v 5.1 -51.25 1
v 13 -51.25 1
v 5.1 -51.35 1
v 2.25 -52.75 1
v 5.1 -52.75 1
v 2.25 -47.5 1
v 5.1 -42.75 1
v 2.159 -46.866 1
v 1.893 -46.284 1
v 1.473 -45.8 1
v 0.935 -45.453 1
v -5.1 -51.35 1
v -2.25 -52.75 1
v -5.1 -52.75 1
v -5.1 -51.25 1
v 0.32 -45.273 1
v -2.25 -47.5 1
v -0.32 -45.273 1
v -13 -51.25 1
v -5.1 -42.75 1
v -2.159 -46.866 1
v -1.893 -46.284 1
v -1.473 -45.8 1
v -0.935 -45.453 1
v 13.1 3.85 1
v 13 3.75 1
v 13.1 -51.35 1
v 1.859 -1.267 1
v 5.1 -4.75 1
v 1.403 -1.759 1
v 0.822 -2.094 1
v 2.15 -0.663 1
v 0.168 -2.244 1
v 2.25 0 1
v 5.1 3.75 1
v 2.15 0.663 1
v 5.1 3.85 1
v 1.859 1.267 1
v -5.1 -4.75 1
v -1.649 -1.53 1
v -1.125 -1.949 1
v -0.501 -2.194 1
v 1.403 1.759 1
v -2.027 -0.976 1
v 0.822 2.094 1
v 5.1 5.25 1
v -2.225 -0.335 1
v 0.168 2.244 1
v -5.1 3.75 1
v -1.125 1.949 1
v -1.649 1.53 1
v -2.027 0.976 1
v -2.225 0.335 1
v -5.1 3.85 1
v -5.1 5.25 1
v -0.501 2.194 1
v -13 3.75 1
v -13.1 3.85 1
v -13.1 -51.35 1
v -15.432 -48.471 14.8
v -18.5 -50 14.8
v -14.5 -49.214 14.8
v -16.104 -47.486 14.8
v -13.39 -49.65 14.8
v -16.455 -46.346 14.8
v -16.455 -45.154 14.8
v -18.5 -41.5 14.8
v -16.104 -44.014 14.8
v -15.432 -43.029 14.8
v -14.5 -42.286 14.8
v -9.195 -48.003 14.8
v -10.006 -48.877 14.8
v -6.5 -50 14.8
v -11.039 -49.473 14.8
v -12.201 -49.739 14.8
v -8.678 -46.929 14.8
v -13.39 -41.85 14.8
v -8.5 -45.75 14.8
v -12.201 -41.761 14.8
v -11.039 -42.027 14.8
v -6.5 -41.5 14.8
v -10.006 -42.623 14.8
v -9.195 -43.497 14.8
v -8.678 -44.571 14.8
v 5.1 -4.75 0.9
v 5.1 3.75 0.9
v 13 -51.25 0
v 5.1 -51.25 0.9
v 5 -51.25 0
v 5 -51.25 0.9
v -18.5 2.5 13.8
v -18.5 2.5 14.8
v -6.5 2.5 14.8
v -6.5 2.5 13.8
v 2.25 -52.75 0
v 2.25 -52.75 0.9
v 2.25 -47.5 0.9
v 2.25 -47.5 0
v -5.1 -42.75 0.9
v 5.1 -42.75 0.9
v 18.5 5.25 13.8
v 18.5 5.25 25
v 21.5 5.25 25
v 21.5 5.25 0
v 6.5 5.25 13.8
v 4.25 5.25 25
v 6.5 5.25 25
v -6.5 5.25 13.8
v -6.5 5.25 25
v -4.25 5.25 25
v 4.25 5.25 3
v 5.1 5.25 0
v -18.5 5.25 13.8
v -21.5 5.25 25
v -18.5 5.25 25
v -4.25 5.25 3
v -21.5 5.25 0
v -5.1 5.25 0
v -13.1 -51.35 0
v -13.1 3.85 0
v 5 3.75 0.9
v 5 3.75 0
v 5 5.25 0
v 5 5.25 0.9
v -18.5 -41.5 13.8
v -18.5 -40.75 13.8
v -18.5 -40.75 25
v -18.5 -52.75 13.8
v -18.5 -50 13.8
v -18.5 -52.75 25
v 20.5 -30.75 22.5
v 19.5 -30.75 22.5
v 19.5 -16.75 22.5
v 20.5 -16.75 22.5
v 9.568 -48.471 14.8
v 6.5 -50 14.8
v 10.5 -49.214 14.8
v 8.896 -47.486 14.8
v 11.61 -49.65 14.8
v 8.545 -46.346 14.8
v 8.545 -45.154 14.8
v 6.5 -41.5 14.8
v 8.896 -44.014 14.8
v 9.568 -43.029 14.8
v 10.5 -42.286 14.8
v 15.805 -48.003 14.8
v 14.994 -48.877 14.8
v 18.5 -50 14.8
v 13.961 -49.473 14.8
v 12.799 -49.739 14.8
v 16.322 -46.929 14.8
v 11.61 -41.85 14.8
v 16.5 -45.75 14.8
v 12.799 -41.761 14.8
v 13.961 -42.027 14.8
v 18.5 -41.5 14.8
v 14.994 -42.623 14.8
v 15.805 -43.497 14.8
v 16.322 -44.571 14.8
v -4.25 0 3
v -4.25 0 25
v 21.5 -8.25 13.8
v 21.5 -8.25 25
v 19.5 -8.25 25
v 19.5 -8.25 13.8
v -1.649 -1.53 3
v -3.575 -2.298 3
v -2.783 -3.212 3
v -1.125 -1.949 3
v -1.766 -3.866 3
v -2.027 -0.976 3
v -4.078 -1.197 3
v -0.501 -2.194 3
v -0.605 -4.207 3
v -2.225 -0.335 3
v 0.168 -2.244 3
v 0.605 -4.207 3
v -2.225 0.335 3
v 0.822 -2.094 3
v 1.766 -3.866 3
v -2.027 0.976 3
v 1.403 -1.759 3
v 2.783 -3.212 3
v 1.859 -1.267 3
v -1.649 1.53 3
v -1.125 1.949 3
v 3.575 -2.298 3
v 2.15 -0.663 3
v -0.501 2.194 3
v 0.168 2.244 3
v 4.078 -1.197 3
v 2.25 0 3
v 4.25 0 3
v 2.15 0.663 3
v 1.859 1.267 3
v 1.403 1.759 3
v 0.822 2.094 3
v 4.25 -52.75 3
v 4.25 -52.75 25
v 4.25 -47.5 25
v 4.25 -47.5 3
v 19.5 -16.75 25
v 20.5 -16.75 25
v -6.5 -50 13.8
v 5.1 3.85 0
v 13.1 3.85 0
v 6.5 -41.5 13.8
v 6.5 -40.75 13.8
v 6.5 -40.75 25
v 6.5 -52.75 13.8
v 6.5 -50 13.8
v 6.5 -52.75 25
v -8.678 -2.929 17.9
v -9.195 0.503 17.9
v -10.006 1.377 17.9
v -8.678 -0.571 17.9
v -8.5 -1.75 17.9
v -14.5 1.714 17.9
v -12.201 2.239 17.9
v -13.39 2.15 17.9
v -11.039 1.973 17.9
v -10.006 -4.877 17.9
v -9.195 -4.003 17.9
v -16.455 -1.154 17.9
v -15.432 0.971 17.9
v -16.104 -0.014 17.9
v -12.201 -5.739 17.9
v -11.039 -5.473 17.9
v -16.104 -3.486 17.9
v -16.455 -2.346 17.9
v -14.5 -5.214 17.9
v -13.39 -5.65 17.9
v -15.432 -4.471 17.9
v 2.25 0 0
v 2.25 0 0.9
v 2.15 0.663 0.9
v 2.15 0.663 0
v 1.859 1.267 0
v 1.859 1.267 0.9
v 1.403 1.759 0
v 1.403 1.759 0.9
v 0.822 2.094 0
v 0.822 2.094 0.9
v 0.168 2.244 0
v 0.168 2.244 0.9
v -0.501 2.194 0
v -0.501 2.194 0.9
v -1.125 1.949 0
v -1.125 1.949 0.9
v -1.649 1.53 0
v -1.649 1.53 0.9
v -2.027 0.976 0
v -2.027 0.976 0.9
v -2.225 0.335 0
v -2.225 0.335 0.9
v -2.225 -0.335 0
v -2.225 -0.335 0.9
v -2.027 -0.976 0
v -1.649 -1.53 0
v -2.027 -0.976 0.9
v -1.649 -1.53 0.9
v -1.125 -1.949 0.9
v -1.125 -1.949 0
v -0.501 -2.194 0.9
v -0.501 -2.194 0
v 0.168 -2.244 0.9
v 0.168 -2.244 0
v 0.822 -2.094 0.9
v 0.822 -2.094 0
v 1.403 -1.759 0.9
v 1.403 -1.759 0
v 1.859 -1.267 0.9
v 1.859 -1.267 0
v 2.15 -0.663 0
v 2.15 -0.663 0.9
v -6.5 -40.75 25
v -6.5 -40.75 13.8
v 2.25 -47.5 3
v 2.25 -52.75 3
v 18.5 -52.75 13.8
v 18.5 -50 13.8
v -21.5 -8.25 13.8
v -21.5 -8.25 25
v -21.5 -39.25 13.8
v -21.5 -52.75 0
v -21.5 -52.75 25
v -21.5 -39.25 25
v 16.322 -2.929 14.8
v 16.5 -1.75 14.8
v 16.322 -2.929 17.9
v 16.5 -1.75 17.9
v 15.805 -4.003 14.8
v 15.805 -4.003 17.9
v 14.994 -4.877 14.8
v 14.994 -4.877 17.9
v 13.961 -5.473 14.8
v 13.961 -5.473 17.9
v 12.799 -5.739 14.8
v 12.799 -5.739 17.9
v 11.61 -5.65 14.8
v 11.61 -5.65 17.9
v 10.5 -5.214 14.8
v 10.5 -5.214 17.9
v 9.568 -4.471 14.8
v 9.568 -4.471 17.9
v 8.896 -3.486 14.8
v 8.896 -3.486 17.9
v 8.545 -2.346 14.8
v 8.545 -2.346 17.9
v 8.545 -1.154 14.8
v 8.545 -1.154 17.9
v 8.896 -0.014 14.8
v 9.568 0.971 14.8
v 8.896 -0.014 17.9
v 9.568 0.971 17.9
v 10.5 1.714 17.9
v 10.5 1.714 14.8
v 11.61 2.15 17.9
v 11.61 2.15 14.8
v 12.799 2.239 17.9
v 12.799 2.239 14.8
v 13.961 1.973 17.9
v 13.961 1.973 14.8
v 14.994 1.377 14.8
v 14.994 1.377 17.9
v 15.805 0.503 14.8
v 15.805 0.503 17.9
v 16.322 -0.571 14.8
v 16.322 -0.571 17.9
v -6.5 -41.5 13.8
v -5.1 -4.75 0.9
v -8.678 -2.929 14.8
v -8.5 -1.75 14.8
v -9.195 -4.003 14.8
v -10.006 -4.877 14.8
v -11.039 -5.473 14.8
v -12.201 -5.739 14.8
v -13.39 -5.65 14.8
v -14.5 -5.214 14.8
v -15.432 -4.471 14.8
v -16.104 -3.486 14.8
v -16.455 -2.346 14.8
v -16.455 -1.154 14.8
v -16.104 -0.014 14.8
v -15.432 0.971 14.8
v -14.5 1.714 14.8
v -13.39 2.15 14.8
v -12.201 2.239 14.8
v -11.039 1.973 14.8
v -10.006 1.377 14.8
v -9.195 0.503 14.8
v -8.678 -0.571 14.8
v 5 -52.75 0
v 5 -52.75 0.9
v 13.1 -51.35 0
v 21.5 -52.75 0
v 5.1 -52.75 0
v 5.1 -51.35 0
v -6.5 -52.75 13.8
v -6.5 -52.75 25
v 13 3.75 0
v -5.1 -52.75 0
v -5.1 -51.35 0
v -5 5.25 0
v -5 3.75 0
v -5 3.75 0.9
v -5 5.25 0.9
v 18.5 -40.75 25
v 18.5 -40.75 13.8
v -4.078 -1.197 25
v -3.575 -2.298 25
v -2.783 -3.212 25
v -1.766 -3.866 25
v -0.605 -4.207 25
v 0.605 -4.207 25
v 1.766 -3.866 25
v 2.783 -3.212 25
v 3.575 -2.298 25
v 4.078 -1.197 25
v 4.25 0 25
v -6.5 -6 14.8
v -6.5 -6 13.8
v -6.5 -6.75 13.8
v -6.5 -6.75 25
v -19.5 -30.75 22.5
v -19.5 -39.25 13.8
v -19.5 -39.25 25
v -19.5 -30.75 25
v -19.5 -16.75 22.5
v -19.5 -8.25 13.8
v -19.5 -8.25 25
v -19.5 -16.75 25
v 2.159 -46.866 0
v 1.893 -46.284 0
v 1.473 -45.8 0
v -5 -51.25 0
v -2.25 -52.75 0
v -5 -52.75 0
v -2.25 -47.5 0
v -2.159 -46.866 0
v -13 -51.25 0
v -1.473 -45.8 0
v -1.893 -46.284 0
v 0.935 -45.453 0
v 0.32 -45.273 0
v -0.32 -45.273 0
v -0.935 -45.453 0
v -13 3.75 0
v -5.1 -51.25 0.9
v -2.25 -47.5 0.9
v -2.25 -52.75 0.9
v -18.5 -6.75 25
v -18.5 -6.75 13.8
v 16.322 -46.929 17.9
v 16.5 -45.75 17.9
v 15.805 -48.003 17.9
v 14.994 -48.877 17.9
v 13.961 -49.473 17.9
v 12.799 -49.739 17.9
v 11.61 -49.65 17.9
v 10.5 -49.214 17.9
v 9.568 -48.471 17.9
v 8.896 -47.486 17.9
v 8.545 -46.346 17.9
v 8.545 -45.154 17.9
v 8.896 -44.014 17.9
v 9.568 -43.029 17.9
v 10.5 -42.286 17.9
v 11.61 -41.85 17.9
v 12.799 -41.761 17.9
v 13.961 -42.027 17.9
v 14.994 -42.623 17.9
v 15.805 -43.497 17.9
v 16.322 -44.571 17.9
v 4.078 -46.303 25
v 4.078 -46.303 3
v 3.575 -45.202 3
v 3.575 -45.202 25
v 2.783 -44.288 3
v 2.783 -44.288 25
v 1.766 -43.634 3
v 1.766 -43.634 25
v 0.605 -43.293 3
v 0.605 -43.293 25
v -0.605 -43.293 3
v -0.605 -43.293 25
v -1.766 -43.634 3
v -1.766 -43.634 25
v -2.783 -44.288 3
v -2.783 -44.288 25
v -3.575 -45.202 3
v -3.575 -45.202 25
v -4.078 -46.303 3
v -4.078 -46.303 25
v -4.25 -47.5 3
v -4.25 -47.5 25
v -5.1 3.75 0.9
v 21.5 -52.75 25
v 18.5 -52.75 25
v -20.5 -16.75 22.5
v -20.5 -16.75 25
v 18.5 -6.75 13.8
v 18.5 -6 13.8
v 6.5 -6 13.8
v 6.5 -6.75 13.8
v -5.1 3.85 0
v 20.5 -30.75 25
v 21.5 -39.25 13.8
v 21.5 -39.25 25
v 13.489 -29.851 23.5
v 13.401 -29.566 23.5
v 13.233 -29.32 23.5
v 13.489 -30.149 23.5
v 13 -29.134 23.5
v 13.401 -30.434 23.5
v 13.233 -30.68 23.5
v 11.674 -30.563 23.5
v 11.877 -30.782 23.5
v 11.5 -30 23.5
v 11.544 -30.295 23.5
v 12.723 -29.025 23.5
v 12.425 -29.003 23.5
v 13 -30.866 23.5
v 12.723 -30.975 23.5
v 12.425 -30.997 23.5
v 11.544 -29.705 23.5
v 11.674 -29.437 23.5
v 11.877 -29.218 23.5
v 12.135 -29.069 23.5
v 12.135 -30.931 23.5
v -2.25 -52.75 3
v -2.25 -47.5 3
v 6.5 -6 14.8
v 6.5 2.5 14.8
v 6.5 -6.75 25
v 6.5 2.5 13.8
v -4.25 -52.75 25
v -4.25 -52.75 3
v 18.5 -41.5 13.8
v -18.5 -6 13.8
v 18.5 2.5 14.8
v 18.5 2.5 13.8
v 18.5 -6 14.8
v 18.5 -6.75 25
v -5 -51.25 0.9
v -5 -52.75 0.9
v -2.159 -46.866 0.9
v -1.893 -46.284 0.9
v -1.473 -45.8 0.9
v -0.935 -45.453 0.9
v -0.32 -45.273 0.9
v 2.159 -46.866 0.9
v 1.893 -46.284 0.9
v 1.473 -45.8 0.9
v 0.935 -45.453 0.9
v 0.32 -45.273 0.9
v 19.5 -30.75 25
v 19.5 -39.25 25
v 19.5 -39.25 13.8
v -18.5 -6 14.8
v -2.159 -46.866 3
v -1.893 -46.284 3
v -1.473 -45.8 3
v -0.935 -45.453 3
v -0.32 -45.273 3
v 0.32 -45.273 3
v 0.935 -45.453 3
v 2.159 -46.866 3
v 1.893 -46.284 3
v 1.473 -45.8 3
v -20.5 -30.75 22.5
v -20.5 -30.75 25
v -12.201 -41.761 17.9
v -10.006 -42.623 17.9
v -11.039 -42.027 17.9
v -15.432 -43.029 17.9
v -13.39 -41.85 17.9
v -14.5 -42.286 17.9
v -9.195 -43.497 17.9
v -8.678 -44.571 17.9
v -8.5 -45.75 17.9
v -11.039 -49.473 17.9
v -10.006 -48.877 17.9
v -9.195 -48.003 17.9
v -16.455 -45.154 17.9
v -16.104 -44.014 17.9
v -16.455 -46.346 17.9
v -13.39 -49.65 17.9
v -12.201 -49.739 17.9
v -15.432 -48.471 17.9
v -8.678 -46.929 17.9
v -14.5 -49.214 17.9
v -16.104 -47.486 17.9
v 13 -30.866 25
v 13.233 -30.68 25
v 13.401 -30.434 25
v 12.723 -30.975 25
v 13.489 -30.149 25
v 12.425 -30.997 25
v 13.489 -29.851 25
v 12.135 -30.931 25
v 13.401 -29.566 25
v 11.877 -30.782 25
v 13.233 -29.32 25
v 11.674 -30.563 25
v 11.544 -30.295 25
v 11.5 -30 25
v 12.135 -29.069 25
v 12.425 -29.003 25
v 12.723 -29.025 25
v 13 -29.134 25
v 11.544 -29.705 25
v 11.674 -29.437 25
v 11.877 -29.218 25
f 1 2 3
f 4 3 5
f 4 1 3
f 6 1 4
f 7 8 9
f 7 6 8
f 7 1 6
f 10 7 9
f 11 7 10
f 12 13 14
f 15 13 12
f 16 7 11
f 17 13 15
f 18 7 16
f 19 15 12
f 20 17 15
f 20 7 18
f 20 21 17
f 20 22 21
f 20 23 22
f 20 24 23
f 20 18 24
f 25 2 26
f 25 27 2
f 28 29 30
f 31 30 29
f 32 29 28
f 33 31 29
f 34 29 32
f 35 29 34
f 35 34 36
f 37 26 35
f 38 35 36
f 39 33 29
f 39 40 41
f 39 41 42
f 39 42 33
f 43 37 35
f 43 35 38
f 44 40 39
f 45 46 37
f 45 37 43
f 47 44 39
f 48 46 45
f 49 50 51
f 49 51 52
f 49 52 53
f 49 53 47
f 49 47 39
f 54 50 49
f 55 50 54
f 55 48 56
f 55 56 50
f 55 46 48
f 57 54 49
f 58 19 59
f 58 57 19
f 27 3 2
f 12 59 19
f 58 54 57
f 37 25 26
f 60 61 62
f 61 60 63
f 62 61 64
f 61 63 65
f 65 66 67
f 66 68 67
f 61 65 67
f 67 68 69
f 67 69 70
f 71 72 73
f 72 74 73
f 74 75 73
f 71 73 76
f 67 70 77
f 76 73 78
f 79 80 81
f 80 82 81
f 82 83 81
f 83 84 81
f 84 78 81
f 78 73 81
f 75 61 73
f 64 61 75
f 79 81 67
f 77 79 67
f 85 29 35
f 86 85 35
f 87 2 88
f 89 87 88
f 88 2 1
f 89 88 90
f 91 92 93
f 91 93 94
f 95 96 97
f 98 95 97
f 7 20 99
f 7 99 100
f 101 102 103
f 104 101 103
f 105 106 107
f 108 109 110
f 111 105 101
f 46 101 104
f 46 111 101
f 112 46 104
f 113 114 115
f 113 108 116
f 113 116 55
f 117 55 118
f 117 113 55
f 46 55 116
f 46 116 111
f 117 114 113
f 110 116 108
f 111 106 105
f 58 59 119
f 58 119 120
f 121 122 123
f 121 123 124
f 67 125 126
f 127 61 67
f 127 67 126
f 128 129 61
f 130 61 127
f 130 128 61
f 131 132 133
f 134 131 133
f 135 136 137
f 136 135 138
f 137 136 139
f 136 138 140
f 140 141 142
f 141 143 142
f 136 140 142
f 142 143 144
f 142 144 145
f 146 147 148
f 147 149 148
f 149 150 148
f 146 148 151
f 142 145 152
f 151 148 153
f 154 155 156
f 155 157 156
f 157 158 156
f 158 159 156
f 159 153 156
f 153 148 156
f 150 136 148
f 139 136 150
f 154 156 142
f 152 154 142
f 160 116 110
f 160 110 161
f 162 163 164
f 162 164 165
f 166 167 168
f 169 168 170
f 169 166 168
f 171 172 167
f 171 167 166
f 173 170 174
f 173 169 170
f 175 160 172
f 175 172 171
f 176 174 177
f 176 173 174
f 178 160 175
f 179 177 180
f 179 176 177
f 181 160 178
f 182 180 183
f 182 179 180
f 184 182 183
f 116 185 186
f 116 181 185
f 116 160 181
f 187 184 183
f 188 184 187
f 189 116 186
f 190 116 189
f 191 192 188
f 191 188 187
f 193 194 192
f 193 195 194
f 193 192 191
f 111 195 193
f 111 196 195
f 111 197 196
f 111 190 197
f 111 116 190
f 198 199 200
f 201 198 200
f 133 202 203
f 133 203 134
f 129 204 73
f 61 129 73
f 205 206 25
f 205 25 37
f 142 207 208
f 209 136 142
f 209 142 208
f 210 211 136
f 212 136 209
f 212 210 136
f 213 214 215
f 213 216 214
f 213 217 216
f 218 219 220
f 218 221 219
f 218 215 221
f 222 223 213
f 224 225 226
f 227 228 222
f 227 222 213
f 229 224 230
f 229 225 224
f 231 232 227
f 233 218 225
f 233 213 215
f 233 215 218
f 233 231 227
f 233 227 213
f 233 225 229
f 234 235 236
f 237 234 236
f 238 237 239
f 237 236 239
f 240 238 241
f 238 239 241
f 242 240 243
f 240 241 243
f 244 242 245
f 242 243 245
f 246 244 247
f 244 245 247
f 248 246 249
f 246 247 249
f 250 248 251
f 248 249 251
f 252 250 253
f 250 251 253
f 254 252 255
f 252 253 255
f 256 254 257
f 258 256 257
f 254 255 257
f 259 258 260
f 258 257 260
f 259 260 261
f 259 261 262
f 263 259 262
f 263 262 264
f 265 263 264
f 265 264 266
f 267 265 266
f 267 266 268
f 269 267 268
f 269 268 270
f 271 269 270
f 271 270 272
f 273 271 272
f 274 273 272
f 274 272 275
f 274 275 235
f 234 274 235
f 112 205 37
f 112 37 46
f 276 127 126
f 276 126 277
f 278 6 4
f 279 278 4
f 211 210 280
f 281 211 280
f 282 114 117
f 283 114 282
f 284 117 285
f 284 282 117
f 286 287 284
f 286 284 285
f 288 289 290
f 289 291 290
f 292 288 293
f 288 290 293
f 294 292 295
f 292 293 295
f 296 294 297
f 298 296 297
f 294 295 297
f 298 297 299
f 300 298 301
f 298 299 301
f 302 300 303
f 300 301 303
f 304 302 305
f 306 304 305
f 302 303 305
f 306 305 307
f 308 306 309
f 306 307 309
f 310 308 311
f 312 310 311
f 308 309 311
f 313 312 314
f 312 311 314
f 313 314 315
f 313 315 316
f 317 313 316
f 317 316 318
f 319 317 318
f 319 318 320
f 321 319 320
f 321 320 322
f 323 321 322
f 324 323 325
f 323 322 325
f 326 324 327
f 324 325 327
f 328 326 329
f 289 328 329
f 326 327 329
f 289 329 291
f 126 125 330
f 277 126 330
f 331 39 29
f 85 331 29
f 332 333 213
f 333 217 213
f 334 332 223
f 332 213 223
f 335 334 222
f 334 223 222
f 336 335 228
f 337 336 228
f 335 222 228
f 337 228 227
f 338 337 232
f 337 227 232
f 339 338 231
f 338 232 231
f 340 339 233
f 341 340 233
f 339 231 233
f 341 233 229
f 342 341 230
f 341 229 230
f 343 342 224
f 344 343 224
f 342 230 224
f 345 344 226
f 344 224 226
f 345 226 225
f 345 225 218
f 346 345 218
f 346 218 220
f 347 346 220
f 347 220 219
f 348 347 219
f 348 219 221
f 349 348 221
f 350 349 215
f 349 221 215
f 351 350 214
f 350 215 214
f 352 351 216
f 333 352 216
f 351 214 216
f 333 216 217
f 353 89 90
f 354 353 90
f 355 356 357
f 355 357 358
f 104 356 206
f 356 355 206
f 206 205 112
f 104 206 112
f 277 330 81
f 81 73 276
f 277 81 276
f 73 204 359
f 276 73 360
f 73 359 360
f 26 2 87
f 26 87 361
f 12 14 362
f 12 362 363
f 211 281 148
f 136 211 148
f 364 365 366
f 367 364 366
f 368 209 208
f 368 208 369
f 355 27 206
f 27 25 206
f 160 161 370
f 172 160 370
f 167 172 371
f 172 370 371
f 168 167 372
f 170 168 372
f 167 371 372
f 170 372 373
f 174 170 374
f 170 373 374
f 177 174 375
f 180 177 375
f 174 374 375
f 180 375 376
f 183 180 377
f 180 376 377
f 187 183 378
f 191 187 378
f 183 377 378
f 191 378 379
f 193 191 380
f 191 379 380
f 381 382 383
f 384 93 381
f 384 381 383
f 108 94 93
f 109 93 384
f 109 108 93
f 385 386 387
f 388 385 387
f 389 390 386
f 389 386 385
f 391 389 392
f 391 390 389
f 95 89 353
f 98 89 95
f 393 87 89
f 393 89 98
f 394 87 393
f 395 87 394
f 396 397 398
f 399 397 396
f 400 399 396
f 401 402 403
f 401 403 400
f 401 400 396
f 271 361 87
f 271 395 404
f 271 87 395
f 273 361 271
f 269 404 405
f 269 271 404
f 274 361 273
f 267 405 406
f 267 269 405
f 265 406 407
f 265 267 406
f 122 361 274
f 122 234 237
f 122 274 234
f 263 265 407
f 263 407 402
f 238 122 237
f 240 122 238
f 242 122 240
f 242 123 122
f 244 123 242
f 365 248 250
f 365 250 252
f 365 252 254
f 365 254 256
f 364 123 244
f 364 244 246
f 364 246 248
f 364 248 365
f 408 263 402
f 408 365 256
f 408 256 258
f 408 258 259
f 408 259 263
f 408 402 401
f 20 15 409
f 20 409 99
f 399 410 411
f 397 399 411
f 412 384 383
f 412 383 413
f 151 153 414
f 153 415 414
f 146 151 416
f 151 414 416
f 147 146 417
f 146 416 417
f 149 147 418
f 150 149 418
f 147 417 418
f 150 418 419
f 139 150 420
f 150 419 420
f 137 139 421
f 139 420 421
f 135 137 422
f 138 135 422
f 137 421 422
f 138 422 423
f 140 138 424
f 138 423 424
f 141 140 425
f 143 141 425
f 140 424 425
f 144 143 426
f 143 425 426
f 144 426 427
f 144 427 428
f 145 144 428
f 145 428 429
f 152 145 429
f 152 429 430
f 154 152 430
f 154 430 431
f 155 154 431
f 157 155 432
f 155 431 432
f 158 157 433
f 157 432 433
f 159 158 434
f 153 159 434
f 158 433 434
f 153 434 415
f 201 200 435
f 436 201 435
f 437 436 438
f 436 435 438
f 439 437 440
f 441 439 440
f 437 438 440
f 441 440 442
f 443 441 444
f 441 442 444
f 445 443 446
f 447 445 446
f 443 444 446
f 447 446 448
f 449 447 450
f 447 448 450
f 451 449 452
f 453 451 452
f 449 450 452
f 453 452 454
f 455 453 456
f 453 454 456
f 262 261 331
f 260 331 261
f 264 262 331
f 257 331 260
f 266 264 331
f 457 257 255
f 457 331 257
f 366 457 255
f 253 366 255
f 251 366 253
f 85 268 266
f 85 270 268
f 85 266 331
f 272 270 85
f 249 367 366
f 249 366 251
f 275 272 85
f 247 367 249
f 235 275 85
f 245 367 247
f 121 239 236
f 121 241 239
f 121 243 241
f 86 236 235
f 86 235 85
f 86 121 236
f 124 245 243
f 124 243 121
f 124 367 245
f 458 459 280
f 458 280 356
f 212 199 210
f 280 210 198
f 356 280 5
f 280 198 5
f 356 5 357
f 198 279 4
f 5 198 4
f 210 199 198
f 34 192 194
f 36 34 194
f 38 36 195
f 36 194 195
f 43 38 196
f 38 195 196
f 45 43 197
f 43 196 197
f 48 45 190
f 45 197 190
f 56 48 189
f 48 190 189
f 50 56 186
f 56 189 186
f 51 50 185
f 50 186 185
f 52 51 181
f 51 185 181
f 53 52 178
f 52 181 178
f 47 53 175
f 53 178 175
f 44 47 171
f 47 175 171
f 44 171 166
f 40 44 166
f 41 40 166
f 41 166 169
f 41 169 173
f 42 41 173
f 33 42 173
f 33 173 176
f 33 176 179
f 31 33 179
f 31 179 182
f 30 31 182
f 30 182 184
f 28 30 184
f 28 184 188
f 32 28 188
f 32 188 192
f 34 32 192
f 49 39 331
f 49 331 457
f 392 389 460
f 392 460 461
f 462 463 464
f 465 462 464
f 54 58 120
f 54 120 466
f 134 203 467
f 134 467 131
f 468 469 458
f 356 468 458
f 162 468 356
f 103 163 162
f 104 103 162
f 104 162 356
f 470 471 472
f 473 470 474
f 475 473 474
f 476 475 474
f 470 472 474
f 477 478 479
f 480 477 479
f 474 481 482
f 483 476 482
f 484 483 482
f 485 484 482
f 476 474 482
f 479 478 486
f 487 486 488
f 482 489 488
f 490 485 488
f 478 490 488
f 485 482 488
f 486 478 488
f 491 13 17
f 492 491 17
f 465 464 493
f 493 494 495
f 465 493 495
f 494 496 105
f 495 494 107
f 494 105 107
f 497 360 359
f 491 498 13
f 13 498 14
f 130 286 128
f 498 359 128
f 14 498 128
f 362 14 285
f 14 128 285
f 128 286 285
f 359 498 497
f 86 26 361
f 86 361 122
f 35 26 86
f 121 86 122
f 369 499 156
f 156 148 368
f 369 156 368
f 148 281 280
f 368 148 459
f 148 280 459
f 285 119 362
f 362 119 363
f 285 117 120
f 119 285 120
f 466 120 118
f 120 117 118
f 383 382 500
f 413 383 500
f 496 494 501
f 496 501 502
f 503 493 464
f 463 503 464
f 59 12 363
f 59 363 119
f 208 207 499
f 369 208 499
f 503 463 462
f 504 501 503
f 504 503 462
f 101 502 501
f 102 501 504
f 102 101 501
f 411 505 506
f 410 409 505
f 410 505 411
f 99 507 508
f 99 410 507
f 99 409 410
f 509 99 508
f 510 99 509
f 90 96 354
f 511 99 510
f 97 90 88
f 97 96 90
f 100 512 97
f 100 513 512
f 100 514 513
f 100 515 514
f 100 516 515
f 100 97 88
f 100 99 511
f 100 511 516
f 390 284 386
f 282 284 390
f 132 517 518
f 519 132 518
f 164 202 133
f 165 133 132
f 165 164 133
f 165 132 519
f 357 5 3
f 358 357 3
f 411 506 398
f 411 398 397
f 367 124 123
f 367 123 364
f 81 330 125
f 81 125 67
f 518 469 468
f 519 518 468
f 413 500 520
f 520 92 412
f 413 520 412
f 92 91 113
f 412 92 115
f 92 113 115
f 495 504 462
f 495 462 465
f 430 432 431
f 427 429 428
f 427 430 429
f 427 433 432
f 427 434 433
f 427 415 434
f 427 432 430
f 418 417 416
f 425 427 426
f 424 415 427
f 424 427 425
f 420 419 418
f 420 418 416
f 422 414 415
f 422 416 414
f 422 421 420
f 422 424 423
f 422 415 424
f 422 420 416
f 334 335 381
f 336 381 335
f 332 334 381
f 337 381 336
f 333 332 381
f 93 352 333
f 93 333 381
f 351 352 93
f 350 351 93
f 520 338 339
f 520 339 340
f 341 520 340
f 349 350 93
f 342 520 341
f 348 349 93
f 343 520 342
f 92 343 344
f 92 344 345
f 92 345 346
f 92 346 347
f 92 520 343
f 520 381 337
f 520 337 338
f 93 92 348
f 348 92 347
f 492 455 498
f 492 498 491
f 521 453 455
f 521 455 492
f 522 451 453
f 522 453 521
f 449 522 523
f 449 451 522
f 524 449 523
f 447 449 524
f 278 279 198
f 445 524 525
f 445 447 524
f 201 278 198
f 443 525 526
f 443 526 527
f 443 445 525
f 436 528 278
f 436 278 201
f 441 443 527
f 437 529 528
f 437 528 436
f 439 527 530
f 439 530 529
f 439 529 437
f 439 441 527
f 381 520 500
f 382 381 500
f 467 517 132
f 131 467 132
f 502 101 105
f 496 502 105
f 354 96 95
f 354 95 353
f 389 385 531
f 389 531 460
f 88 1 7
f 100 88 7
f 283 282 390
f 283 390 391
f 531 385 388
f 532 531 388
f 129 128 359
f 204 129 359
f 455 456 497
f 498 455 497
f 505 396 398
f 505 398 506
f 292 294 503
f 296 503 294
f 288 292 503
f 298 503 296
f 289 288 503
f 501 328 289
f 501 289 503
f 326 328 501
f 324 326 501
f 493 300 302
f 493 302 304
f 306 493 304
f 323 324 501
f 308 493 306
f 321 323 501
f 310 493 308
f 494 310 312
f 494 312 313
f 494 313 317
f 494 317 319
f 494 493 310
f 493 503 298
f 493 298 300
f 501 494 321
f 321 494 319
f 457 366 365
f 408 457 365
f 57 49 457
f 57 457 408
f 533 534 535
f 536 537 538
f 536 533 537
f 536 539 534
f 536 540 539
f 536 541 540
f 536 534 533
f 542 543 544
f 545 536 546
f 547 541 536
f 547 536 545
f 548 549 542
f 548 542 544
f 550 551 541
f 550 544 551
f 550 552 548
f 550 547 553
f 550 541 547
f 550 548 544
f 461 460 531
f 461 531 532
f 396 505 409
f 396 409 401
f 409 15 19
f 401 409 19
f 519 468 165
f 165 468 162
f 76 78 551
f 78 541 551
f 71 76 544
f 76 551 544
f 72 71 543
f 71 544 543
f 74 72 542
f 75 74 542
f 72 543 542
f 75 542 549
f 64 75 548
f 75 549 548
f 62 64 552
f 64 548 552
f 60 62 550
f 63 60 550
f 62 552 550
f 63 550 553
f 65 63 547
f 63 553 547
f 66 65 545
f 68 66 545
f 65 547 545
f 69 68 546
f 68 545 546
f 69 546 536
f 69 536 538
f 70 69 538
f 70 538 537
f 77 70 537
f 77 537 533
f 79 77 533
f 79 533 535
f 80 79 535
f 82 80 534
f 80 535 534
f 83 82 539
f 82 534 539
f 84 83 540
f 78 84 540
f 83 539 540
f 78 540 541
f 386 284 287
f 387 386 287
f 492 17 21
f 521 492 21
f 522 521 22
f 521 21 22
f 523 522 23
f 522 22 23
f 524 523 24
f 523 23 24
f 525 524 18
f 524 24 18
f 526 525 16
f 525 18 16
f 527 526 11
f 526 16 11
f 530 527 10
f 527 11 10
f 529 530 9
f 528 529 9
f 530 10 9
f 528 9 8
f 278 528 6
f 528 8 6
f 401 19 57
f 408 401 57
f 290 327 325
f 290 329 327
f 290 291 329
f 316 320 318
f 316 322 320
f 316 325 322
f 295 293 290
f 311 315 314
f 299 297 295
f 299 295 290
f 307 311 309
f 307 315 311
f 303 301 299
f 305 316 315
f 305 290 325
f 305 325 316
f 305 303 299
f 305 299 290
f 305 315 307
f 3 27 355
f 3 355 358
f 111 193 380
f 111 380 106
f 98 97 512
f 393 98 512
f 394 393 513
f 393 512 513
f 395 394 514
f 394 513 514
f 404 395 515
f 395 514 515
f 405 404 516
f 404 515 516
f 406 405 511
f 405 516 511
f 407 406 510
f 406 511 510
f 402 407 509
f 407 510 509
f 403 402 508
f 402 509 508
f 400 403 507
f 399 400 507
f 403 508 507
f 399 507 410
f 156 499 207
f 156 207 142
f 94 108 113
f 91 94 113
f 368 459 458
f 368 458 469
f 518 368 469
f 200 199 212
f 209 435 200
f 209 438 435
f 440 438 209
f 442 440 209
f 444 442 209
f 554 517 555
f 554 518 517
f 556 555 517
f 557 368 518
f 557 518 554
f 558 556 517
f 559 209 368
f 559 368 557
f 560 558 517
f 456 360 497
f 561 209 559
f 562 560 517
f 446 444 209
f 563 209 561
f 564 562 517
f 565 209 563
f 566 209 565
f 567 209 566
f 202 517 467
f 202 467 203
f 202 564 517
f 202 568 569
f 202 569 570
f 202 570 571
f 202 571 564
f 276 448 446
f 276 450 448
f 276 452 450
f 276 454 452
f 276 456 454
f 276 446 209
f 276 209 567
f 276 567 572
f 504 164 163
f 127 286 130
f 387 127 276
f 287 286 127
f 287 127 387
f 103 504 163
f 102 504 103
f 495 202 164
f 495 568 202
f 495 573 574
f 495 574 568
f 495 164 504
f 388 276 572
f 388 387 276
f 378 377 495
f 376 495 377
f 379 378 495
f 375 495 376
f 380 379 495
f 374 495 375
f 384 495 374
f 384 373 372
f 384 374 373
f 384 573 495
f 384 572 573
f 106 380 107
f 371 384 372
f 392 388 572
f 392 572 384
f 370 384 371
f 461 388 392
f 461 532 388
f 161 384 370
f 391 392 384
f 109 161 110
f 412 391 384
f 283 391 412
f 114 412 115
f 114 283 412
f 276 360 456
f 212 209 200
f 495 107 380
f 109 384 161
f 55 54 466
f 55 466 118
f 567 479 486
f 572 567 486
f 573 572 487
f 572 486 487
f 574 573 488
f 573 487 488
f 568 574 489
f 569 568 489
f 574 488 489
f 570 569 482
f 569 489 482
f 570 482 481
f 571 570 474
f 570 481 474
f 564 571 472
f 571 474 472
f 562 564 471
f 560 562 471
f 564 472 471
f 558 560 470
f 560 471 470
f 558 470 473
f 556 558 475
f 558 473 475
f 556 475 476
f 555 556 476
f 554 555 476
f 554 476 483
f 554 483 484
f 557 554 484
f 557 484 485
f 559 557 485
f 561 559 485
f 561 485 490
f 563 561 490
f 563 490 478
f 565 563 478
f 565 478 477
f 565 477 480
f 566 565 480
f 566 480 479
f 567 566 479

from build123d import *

# Parameters (mm, degrees)
SKETCH1_W                      = 8
SKETCH1_H                      = 1.4
BOSS_EXTRUDE1_DEPTH            = 1
SKETCH2_W                      = 34.6
SKETCH2_H                      = 58
BOSS_EXTRUDE2_DEPTH            = 24
SKETCH3_W                      = 26
SKETCH3_H                      = 55
BOSS_EXTRUDE3_DEPTH            = 1
BOSS_EXTRUDE4_DEPTH            = 1
SKETCH5_W                      = 8
SKETCH5_H                      = 1.4
BOSS_EXTRUDE5_DEPTH            = 1
SKETCH6_W                      = 10.2
SKETCH6_H                      = 8.5
CUT_EXTRUDE1_DEPTH             = 0.1
SKETCH7_W                      = 10.2
SKETCH7_H                      = 8.5
CUT_EXTRUDE2_DEPTH             = 0.1
SKETCH8_W                      = 25
SKETCH8_H                      = 58
BOSS_EXTRUDE6_DEPTH            = 8.4
SKETCH9_W                      = 10
SKETCH9_H                      = 0.9
BOSS_EXTRUDE7_DEPTH            = 1.5
SKETCH10_W                     = 10
SKETCH10_H                     = 0.9
BOSS_EXTRUDE8_DEPTH            = 1.5
SKETCH11_W                     = 12
SKETCH11_H                     = 11.2
CUT_EXTRUDE3_DEPTH             = 12
SKETCH12_W                     = 1
SKETCH12_H                     = 8.5
BOSS_EXTRUDE9_DEPTH            = 12
SKETCH13_W                     = 12
SKETCH13_H                     = 11.2
CUT_EXTRUDE4_DEPTH             = 12
SKETCH14_W                     = 1
SKETCH14_H                     = 8.5
BOSS_EXTRUDE10_DEPTH           = 12
SKETCH15_W                     = 12
SKETCH15_H                     = 11.2
CUT_EXTRUDE5_DEPTH             = 12
SKETCH16_W                     = 1
SKETCH16_H                     = 8.5
BOSS_EXTRUDE11_DEPTH           = 12
SKETCH17_W                     = 12
SKETCH17_H                     = 11.2
CUT_EXTRUDE6_DEPTH             = 12
SKETCH18_W                     = 1
SKETCH18_H                     = 8.5
BOSS_EXTRUDE12_DEPTH           = 12
CUT_EXTRUDE7_DEPTH             = 22
CUT_EXTRUDE8_DEPTH             = 25
CUT_EXTRUDE9_DEPTH             = 1.9
SKETCH22_W                     = 11.2
SKETCH22_H                     = 31
CUT_EXTRUDE10_DEPTH            = 2
SKETCH23_W                     = 2.5
SKETCH23_H                     = 14
BOSS_EXTRUDE13_DEPTH           = 1
SKETCH24_W                     = 11.2
SKETCH24_H                     = 31
CUT_EXTRUDE11_DEPTH            = 2
SKETCH25_W                     = 2.5
SKETCH25_H                     = 14
BOSS_EXTRUDE14_DEPTH           = 1
CUT_EXTRUDE12_DEPTH            = 22
SKETCH27_W                     = 4
SKETCH27_H                     = 3.1
SKETCH28_W                     = 4
SKETCH28_H                     = 3.1
SKETCH29_W                     = 4
SKETCH29_H                     = 3.1
SKETCH30_W                     = 4
SKETCH30_H                     = 3.1
F_2_0_2_DIAMETER_HOLE1_D       = 2
F_2_0_2_DIAMETER_HOLE1_DEPTH   = 1.5
F_4_5_4_5_DIAMETER_HOLE1_D     = 4.5
F_4_5_4_5_DIAMETER_HOLE1_DEPTH = 0.9
F_4_5_4_5_DIAMETER_HOLE2_D     = 4.5
F_4_5_4_5_DIAMETER_HOLE2_DEPTH = 24


with BuildPart() as part:
    # Sketch1 → Boss-Extrude1 (new body)
    with BuildSketch(Plane(origin=(0, 0, 0), x_dir=(-1, 0, 0), z_dir=(0, 0, -1))):
        with Locations((-9.1, 4.55)):
            Rectangle(SKETCH1_W, SKETCH1_H)
    extrude(amount=-BOSS_EXTRUDE1_DEPTH)

    # Sketch2 → Boss-Extrude2 (add)
    with BuildSketch(Plane(origin=(0, 0, 1), x_dir=(-1, 0, 0), z_dir=(0, 0, -1))):
        with Locations((4.2, -23.75)):
            Rectangle(SKETCH2_W, SKETCH2_H)
    extrude(amount=-BOSS_EXTRUDE2_DEPTH)

    # Sketch3 → Boss-Extrude3 (add)
    with BuildSketch(Plane(origin=(0, 0, 1), x_dir=(-1, 0, 0), z_dir=(0, 0, -1))):
        with Locations((0, -23.75)):
            Rectangle(SKETCH3_W, SKETCH3_H)
    extrude(amount=BOSS_EXTRUDE3_DEPTH)

    # Sketch4 → Boss-Extrude4 (add)
    with BuildSketch(Plane(origin=(0, 0, 1), x_dir=(-1, 0, 0), z_dir=(0, 0, -1))):
        Polygon((5.1, 5.25), (21.5, 5.25), (21.5, -52.75), (5.1, -52.75), (5.1, -51.35), (13.1, -51.35), (13.1, 3.85), (5.1, 3.85), align=None)
    extrude(amount=BOSS_EXTRUDE4_DEPTH)

    # Sketch5 → Boss-Extrude5 (add)
    with BuildSketch(Plane(origin=(0, 0, 1), x_dir=(-1, 0, 0), z_dir=(0, 0, -1))):
        with Locations((-9.1, -52.05)):
            Rectangle(SKETCH5_W, SKETCH5_H)
    extrude(amount=BOSS_EXTRUDE5_DEPTH)

    # Sketch6 → Cut-Extrude1 (cut)
    with BuildSketch(Plane.XY.offset(1)):
        with Locations((0, -0.5)):
            Rectangle(SKETCH6_W, SKETCH6_H)
    extrude(amount=-CUT_EXTRUDE1_DEPTH, mode=Mode.SUBTRACT)

    # Sketch7 → Cut-Extrude2 (cut)
    with BuildSketch(Plane.XY.offset(1)):
        with Locations((0, -47)):
            Rectangle(SKETCH7_W, SKETCH7_H)
    extrude(amount=-CUT_EXTRUDE2_DEPTH, mode=Mode.SUBTRACT)

    # Sketch8 → Boss-Extrude6 (add)
    with BuildSketch(Plane(origin=(13.1, 0, 0), x_dir=(0, 0, -1), z_dir=(1, 0, 0))):
        with Locations((-12.5, -23.75)):
            Rectangle(SKETCH8_W, SKETCH8_H)
    extrude(amount=BOSS_EXTRUDE6_DEPTH)

    # Sketch9 → Boss-Extrude7 (add)
    with BuildSketch(Plane.XZ.offset(51.25)):
        with Locations((0, 0.45)):
            Rectangle(SKETCH9_W, SKETCH9_H)
    extrude(amount=BOSS_EXTRUDE7_DEPTH)

    # Sketch10 → Boss-Extrude8 (add)
    with BuildSketch(Plane(origin=(0, 3.75, 0), x_dir=(-1, 0, 0), z_dir=(0, 1, 0))):
        with Locations((0, 0.45)):
            Rectangle(SKETCH10_W, SKETCH10_H)
    extrude(amount=BOSS_EXTRUDE8_DEPTH)

    # Sketch11 → Cut-Extrude3 (cut)
    with BuildSketch(Plane(origin=(0, 5.25, 0), x_dir=(-1, 0, 0), z_dir=(0, 1, 0))):
        with Locations((-12.5, 19.4)):
            Rectangle(SKETCH11_W, SKETCH11_H)
    extrude(amount=-CUT_EXTRUDE3_DEPTH, mode=Mode.SUBTRACT)

    # Sketch12 → Boss-Extrude9 (add)
    with BuildSketch(Plane(origin=(6.5, 0, 0), x_dir=(0, 0, -1), z_dir=(1, 0, 0))):
        with Locations((-14.3, -1.75)):
            Rectangle(SKETCH12_W, SKETCH12_H)
    extrude(amount=BOSS_EXTRUDE9_DEPTH)

    # Sketch13 → Cut-Extrude4 (cut)
    with BuildSketch(Plane(origin=(0, 5.25, 0), x_dir=(-1, 0, 0), z_dir=(0, 1, 0))):
        with Locations((12.5, 19.4)):
            Rectangle(SKETCH13_W, SKETCH13_H)
    extrude(amount=-CUT_EXTRUDE4_DEPTH, mode=Mode.SUBTRACT)

    # Sketch14 → Boss-Extrude10 (add)
    with BuildSketch(Plane(origin=(-18.5, 0, 0), x_dir=(0, 0, -1), z_dir=(1, 0, 0))):
        with Locations((-14.3, -1.75)):
            Rectangle(SKETCH14_W, SKETCH14_H)
    extrude(amount=BOSS_EXTRUDE10_DEPTH)

    # Sketch15 → Cut-Extrude5 (cut)
    with BuildSketch(Plane.XZ.offset(52.75)):
        with Locations((12.5, 19.4)):
            Rectangle(SKETCH15_W, SKETCH15_H)
    extrude(amount=-CUT_EXTRUDE5_DEPTH, mode=Mode.SUBTRACT)

    # Sketch16 → Boss-Extrude11 (add)
    with BuildSketch(Plane.ZY.offset(-18.5)):
        with Locations((14.3, -45.75)):
            Rectangle(SKETCH16_W, SKETCH16_H)
    extrude(amount=BOSS_EXTRUDE11_DEPTH)

    # Sketch17 → Cut-Extrude6 (cut)
    with BuildSketch(Plane.XZ.offset(52.75)):
        with Locations((-12.5, 19.4)):
            Rectangle(SKETCH17_W, SKETCH17_H)
    extrude(amount=-CUT_EXTRUDE6_DEPTH, mode=Mode.SUBTRACT)

    # Sketch18 → Boss-Extrude12 (add)
    with BuildSketch(Plane.ZY.offset(6.5)):
        with Locations((14.3, -45.75)):
            Rectangle(SKETCH18_W, SKETCH18_H)
    extrude(amount=BOSS_EXTRUDE12_DEPTH)

    # Sketch19 → Cut-Extrude7 (cut)
    with BuildSketch(Plane.XY.offset(25)):
        with BuildLine():
            Line((4.25, -52.75), (4.25, -47.5))
            ThreePointArc((4.25, -47.5), (0, -43.25), (-4.25, -47.5))
            Line((-4.25, -47.5), (-4.25, -52.75))
            Line((-4.25, -52.75), (4.25, -52.75))
        make_face()
    extrude(amount=-CUT_EXTRUDE7_DEPTH, mode=Mode.SUBTRACT)

    # Sketch20 → Cut-Extrude8 (cut, through all)
    with BuildSketch(Plane(origin=(0, 0, 1), x_dir=(-1, 0, 0), z_dir=(0, 0, -1))):
        with BuildLine():
            Line((-2.25, -52.75), (2.25, -52.75))
            Line((2.25, -52.75), (2.25, -47.5))
            ThreePointArc((2.25, -47.5), (0, -45.25), (-2.25, -47.5))
            Line((-2.25, -47.5), (-2.25, -52.75))
        make_face()
    extrude(amount=-CUT_EXTRUDE8_DEPTH, mode=Mode.SUBTRACT)

    # Sketch21 → Cut-Extrude9 (cut, through all)
    with BuildSketch(Plane.XY.offset(0.9)):
        with BuildLine():
            Line((-2.25, -52.75), (2.25, -52.75))
            Line((2.25, -52.75), (2.25, -47.5))
            ThreePointArc((2.25, -47.5), (0, -45.25), (-2.25, -47.5))
            Line((-2.25, -47.5), (-2.25, -52.75))
        make_face()
    extrude(amount=-CUT_EXTRUDE9_DEPTH, mode=Mode.SUBTRACT)

    # Sketch22 → Cut-Extrude10 (cut)
    with BuildSketch(Plane(origin=(21.5, 0, 0), x_dir=(0, 0, -1), z_dir=(1, 0, 0))):
        with Locations((-19.4, -23.75)):
            Rectangle(SKETCH22_W, SKETCH22_H)
    extrude(amount=-CUT_EXTRUDE10_DEPTH, mode=Mode.SUBTRACT)

    # Sketch23 → Boss-Extrude13 (add)
    with BuildSketch(Plane(origin=(19.5, 0, 0), x_dir=(0, 0, -1), z_dir=(1, 0, 0))):
        with Locations((-23.75, -23.75)):
            Rectangle(SKETCH23_W, SKETCH23_H)
    extrude(amount=BOSS_EXTRUDE13_DEPTH)

    # Sketch24 → Cut-Extrude11 (cut)
    with BuildSketch(Plane.ZY.offset(21.5)):
        with Locations((19.4, -23.75)):
            Rectangle(SKETCH24_W, SKETCH24_H)
    extrude(amount=-CUT_EXTRUDE11_DEPTH, mode=Mode.SUBTRACT)

    # Sketch25 → Boss-Extrude14 (add)
    with BuildSketch(Plane.ZY.offset(19.5)):
        with Locations((23.75, -23.75)):
            Rectangle(SKETCH25_W, SKETCH25_H)
    extrude(amount=BOSS_EXTRUDE14_DEPTH)

    # Sketch26 → Cut-Extrude12 (cut)
    with BuildSketch(Plane.XY.offset(25)):
        with BuildLine():
            Line((-4.25, 5.25), (-4.25, 0))
            ThreePointArc((-4.25, 0), (0, -4.25), (4.25, 0))
            Line((4.25, 0), (4.25, 5.25))
            Line((4.25, 5.25), (-4.25, 5.25))
        make_face()
    extrude(amount=-CUT_EXTRUDE12_DEPTH, mode=Mode.SUBTRACT)

    # Sketch27 → Revolve1 (revolve)
    with BuildSketch(Plane.XZ.offset(45.75)):
        with Locations((14.5, 16.35)):
            Rectangle(SKETCH27_W, SKETCH27_H)
    revolve(axis=Axis((12.5, -45.75, 17.9), (0, 0, -1)))

    # Sketch28 → Revolve2 (revolve)
    with BuildSketch(Plane.XZ.offset(1.75)):
        with Locations((14.5, 16.35)):
            Rectangle(SKETCH28_W, SKETCH28_H)
    revolve(axis=Axis((12.5, -1.75, 17.9), (0, 0, -1)))

    # Sketch29 → Revolve3 (revolve)
    with BuildSketch(Plane.XZ.offset(45.75)):
        with Locations((-10.5, 16.35)):
            Rectangle(SKETCH29_W, SKETCH29_H)
    revolve(axis=Axis((-12.5, -45.75, 17.9), (0, 0, -1)))

    # Sketch30 → Revolve4 (revolve)
    with BuildSketch(Plane.XZ.offset(1.75)):
        with Locations((-10.5, 16.35)):
            Rectangle(SKETCH30_W, SKETCH30_H)
    revolve(axis=Axis((-12.5, -1.75, 17.9), (0, 0, -1)))

    # Ø2.0 (2) Diameter Hole1
    with Locations(Plane.XY.offset(25)):
        with Locations((12.5, -30)):
            Hole(F_2_0_2_DIAMETER_HOLE1_D / 2, depth=F_2_0_2_DIAMETER_HOLE1_DEPTH)

    # Ø4.5 (4.5) Diameter Hole1
    with Locations(Plane(origin=(0, 0, 0), x_dir=(-1, 0, 0), z_dir=(0, 0, -1))):
        with Locations((0, 0)):
            Hole(F_4_5_4_5_DIAMETER_HOLE1_D / 2, depth=F_4_5_4_5_DIAMETER_HOLE1_DEPTH)

    # Ø4.5 (4.5) Diameter Hole2
    with Locations(Plane(origin=(0, 0, 1), x_dir=(-1, 0, 0), z_dir=(0, 0, -1))):
        with Locations((0, 0)):
            Hole(F_4_5_4_5_DIAMETER_HOLE2_D / 2, depth=F_4_5_4_5_DIAMETER_HOLE2_DEPTH)


solid = part.part
